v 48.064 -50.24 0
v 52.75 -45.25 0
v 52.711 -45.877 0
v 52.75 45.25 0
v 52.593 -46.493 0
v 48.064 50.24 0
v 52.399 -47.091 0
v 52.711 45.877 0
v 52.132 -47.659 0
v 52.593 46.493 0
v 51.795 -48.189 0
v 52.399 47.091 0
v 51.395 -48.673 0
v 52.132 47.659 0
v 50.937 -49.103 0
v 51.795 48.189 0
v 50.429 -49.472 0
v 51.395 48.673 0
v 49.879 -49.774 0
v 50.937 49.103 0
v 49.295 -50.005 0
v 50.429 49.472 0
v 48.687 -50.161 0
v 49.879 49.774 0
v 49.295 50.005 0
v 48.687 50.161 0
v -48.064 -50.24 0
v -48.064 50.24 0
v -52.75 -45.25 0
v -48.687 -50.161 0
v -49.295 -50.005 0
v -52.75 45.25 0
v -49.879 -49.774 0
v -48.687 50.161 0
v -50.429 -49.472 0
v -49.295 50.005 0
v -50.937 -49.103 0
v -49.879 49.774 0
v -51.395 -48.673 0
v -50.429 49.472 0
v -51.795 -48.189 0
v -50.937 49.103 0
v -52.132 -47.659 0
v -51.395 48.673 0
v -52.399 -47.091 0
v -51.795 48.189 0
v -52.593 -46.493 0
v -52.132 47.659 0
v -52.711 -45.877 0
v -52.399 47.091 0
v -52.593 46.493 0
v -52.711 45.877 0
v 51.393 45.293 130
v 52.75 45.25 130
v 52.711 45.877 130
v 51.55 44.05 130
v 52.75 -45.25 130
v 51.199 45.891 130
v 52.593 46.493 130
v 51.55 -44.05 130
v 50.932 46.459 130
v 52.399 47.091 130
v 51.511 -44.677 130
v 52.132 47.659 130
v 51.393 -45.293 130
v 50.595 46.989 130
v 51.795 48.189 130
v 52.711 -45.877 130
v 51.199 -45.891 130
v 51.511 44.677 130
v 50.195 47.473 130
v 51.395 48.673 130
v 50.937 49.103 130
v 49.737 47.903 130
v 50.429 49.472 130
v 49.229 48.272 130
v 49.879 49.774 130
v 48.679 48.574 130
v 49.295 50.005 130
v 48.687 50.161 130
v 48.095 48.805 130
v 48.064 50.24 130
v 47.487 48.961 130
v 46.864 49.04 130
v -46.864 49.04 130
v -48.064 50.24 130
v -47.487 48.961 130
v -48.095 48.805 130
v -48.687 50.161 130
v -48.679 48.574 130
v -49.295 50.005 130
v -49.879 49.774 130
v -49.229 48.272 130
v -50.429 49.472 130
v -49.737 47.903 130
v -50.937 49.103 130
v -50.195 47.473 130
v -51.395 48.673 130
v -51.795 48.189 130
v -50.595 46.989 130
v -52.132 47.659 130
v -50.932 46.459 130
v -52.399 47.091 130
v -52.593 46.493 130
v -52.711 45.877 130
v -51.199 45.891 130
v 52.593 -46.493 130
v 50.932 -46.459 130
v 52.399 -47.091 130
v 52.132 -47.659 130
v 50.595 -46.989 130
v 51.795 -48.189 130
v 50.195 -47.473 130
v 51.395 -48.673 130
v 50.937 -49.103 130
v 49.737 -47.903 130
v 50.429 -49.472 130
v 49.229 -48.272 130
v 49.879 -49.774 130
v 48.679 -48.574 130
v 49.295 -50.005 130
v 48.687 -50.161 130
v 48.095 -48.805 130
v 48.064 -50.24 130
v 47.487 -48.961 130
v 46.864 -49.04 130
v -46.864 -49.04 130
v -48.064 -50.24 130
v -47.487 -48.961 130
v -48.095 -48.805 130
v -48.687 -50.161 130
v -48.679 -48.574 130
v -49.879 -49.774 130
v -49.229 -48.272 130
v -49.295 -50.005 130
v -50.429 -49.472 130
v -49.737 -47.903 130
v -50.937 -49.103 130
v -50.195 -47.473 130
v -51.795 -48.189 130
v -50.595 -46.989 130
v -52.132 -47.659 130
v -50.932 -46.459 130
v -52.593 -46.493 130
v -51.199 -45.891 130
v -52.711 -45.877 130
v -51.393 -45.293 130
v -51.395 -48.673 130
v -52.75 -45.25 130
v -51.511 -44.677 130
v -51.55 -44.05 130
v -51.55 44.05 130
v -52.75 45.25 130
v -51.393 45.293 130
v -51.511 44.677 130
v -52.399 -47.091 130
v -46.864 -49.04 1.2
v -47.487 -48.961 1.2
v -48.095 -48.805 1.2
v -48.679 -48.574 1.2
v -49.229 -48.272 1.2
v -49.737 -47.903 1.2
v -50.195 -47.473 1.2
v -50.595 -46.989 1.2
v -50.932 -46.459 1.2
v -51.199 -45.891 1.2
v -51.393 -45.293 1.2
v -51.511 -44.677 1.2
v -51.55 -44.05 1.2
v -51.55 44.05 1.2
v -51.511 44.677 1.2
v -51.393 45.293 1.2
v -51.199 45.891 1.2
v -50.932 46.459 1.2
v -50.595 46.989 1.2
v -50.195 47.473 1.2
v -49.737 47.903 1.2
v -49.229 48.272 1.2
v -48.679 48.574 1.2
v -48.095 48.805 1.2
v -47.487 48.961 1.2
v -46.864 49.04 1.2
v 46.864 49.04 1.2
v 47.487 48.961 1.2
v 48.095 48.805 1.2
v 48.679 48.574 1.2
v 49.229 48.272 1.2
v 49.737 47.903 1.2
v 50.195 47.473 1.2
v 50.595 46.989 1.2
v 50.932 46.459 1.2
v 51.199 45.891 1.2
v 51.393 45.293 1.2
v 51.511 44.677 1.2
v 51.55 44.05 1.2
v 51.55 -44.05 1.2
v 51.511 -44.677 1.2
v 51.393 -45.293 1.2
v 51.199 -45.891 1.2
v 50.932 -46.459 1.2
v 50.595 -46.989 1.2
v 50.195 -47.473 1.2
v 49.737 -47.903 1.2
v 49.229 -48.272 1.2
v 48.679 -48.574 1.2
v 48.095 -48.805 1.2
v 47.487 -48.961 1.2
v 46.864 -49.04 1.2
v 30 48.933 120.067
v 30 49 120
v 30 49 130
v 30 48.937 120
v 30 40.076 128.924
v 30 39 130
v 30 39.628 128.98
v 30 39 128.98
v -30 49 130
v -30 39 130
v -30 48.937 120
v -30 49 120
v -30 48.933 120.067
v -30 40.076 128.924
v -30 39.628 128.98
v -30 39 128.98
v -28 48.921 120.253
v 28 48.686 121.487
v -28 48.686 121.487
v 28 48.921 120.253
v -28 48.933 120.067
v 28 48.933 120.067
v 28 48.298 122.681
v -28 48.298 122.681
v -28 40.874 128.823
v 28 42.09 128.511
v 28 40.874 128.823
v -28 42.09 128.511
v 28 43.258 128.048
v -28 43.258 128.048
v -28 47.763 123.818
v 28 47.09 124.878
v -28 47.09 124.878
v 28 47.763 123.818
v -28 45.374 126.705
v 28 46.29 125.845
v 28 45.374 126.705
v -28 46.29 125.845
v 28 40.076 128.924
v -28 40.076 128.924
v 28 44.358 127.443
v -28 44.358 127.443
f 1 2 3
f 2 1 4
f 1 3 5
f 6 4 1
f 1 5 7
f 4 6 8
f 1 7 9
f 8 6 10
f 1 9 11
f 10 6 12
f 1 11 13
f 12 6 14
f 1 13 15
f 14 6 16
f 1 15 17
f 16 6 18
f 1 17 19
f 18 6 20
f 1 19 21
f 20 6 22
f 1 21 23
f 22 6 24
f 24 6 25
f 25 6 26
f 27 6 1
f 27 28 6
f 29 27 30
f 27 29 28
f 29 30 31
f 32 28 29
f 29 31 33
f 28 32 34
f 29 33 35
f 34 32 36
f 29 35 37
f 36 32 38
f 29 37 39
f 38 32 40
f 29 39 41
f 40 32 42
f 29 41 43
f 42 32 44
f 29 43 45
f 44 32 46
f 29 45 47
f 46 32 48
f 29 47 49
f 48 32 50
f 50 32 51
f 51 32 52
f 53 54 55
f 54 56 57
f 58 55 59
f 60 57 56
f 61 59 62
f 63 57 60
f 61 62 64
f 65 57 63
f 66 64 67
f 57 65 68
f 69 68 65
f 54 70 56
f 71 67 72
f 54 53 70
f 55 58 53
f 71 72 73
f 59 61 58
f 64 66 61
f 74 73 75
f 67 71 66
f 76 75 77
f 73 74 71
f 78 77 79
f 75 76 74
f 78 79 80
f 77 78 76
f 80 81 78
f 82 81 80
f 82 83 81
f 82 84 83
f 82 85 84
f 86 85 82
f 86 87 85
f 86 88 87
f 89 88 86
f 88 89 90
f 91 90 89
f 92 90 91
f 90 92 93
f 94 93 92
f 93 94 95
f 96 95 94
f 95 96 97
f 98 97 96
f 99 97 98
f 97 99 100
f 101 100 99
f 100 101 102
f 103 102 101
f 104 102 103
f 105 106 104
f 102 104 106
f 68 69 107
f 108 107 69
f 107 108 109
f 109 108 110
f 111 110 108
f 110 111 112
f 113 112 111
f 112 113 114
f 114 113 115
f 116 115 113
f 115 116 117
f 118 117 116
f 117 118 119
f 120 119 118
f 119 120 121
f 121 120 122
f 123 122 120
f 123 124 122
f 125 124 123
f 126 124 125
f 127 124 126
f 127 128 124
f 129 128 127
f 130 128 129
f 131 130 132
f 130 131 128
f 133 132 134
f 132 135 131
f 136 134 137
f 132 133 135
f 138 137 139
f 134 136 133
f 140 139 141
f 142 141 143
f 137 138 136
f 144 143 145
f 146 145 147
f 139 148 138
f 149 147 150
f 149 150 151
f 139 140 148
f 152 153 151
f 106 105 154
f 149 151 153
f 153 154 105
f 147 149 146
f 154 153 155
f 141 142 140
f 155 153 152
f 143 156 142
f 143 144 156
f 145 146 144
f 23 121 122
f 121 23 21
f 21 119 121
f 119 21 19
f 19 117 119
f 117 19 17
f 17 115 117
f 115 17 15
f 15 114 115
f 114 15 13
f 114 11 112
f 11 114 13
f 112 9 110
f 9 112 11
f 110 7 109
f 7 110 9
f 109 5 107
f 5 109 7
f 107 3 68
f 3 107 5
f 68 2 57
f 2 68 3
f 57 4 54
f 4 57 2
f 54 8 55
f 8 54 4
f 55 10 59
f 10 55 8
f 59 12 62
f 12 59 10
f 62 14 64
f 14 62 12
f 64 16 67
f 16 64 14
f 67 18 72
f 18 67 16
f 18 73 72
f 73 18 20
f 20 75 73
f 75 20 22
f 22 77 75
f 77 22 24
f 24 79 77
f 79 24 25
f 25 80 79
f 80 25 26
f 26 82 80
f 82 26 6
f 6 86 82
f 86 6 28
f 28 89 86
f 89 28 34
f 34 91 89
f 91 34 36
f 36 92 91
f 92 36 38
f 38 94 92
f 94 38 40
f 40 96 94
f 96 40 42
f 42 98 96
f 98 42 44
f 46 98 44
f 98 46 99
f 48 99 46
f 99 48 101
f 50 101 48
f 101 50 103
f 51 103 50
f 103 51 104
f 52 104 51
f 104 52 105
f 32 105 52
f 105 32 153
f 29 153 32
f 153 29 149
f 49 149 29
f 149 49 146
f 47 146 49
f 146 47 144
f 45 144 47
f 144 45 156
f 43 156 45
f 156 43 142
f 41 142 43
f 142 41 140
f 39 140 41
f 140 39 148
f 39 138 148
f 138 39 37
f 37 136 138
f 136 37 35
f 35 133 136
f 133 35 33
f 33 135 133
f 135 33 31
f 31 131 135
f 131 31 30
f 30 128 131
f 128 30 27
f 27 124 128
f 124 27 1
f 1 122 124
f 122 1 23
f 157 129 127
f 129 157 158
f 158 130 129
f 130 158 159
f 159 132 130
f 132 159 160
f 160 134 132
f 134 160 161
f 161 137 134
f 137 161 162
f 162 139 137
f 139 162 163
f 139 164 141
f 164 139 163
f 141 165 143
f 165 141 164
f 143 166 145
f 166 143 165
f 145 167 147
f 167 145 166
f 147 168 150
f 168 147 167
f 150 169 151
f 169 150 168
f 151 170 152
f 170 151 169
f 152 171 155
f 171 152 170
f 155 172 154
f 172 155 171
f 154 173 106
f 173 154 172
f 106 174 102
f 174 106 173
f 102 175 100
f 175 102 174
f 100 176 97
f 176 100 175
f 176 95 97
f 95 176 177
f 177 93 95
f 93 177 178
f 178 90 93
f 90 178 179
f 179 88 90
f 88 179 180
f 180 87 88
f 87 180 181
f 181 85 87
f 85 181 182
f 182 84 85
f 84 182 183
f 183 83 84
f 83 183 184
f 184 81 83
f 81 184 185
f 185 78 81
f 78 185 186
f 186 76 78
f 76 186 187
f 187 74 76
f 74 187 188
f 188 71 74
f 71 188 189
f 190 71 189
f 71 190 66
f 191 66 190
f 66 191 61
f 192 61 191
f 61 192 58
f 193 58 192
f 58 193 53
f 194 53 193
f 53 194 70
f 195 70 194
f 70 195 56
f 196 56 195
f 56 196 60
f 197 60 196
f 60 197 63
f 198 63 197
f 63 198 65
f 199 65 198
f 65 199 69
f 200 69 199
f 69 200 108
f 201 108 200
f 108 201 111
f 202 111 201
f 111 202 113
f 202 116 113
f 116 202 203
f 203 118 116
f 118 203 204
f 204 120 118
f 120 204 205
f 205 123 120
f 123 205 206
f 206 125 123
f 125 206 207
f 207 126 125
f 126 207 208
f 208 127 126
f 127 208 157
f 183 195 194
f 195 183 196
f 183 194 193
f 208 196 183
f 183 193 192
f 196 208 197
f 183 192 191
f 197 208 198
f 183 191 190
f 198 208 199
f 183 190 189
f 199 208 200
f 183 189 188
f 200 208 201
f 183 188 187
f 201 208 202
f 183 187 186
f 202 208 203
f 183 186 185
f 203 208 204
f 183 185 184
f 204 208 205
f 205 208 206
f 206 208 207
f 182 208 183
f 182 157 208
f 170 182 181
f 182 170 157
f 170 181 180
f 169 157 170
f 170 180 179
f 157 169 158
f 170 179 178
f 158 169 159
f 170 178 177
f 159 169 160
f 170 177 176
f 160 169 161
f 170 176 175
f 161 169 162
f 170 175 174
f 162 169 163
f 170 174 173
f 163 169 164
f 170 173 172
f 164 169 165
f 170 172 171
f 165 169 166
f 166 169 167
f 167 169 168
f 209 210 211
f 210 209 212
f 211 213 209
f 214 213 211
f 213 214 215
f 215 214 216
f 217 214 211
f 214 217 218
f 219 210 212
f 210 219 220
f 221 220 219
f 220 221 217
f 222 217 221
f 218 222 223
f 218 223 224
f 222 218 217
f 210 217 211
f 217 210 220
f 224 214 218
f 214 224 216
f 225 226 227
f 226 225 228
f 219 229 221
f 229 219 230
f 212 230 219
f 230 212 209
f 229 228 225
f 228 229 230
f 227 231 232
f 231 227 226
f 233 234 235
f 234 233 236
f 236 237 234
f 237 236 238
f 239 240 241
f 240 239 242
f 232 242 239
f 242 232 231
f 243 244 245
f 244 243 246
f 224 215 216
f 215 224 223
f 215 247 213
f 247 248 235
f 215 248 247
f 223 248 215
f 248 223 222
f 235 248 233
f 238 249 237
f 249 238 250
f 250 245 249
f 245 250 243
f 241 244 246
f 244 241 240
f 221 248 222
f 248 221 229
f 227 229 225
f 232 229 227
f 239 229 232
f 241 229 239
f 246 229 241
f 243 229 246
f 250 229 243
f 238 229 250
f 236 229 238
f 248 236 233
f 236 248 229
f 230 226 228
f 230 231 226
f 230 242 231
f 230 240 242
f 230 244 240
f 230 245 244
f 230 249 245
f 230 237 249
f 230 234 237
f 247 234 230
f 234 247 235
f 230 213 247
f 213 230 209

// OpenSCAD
$fn=50;

$border_width = 1.2;
$radius = 5;
$box_width = 98;
$box_depth = 93;
$box_height = 130;


module round_cube(width, depth, height, radius) {    
    minkowski() {
        cube([
            width - radius*2,
            depth - radius*2,
            height - radius*2], center=true);
        sphere(radius);
    }
}

module rounded_rectangle(width, height, radius) {
    minkowski() {
        square([width - radius/2, height - radius/2], center=true);
        circle(radius);
    }
}

module rounded_rectangle_border(width, height, radius, border_width) {
    difference() {
      rounded_rectangle(width, height, radius);
      rounded_rectangle(width - border_width*2, height - border_width*2, radius);       
    }
}

module box(width, depth, height, radius, border_width) {
    linear_extrude(height)
    rounded_rectangle_border(width, depth, radius, border_width);
    
    linear_extrude(border_width)
    rounded_rectangle(width, depth, $radius);
}

module box_with_label(width, depth, height, radius, border_width) {
    box(width, depth, height, radius, border_width);

    $label_width = 60;
    $label_depth = 10;
    $label_height = 10;

    translate([-$label_width / 2, width/2 - $label_depth, height - $label_height])
    label($label_width, $label_depth, $label_height);
}

module label(width, depth, height) {
    difference() {
      cube([width, depth, height]);

      translate([width/2, 0, -1])
      rotate([90, 0, 90])
      cylinder(h = width + 1, r = depth, center = true);
    };

    $triangle_width = 2;

    // Left triangle
    label_triangle(depth, $triangle_width);
    
    // Right triangle
    translate([width - $triangle_width, 0, 0])
    label_triangle(depth, $triangle_width);
}

module label_triangle(size, triangle_width) {
    rotate([90, 0, 90])
    linear_extrude(triangle_width)
    polygon([[size, size], [0, size], [size, 0]]);
}
    

box_with_label($box_width, $box_depth, $box_height, $radius, $border_width);
